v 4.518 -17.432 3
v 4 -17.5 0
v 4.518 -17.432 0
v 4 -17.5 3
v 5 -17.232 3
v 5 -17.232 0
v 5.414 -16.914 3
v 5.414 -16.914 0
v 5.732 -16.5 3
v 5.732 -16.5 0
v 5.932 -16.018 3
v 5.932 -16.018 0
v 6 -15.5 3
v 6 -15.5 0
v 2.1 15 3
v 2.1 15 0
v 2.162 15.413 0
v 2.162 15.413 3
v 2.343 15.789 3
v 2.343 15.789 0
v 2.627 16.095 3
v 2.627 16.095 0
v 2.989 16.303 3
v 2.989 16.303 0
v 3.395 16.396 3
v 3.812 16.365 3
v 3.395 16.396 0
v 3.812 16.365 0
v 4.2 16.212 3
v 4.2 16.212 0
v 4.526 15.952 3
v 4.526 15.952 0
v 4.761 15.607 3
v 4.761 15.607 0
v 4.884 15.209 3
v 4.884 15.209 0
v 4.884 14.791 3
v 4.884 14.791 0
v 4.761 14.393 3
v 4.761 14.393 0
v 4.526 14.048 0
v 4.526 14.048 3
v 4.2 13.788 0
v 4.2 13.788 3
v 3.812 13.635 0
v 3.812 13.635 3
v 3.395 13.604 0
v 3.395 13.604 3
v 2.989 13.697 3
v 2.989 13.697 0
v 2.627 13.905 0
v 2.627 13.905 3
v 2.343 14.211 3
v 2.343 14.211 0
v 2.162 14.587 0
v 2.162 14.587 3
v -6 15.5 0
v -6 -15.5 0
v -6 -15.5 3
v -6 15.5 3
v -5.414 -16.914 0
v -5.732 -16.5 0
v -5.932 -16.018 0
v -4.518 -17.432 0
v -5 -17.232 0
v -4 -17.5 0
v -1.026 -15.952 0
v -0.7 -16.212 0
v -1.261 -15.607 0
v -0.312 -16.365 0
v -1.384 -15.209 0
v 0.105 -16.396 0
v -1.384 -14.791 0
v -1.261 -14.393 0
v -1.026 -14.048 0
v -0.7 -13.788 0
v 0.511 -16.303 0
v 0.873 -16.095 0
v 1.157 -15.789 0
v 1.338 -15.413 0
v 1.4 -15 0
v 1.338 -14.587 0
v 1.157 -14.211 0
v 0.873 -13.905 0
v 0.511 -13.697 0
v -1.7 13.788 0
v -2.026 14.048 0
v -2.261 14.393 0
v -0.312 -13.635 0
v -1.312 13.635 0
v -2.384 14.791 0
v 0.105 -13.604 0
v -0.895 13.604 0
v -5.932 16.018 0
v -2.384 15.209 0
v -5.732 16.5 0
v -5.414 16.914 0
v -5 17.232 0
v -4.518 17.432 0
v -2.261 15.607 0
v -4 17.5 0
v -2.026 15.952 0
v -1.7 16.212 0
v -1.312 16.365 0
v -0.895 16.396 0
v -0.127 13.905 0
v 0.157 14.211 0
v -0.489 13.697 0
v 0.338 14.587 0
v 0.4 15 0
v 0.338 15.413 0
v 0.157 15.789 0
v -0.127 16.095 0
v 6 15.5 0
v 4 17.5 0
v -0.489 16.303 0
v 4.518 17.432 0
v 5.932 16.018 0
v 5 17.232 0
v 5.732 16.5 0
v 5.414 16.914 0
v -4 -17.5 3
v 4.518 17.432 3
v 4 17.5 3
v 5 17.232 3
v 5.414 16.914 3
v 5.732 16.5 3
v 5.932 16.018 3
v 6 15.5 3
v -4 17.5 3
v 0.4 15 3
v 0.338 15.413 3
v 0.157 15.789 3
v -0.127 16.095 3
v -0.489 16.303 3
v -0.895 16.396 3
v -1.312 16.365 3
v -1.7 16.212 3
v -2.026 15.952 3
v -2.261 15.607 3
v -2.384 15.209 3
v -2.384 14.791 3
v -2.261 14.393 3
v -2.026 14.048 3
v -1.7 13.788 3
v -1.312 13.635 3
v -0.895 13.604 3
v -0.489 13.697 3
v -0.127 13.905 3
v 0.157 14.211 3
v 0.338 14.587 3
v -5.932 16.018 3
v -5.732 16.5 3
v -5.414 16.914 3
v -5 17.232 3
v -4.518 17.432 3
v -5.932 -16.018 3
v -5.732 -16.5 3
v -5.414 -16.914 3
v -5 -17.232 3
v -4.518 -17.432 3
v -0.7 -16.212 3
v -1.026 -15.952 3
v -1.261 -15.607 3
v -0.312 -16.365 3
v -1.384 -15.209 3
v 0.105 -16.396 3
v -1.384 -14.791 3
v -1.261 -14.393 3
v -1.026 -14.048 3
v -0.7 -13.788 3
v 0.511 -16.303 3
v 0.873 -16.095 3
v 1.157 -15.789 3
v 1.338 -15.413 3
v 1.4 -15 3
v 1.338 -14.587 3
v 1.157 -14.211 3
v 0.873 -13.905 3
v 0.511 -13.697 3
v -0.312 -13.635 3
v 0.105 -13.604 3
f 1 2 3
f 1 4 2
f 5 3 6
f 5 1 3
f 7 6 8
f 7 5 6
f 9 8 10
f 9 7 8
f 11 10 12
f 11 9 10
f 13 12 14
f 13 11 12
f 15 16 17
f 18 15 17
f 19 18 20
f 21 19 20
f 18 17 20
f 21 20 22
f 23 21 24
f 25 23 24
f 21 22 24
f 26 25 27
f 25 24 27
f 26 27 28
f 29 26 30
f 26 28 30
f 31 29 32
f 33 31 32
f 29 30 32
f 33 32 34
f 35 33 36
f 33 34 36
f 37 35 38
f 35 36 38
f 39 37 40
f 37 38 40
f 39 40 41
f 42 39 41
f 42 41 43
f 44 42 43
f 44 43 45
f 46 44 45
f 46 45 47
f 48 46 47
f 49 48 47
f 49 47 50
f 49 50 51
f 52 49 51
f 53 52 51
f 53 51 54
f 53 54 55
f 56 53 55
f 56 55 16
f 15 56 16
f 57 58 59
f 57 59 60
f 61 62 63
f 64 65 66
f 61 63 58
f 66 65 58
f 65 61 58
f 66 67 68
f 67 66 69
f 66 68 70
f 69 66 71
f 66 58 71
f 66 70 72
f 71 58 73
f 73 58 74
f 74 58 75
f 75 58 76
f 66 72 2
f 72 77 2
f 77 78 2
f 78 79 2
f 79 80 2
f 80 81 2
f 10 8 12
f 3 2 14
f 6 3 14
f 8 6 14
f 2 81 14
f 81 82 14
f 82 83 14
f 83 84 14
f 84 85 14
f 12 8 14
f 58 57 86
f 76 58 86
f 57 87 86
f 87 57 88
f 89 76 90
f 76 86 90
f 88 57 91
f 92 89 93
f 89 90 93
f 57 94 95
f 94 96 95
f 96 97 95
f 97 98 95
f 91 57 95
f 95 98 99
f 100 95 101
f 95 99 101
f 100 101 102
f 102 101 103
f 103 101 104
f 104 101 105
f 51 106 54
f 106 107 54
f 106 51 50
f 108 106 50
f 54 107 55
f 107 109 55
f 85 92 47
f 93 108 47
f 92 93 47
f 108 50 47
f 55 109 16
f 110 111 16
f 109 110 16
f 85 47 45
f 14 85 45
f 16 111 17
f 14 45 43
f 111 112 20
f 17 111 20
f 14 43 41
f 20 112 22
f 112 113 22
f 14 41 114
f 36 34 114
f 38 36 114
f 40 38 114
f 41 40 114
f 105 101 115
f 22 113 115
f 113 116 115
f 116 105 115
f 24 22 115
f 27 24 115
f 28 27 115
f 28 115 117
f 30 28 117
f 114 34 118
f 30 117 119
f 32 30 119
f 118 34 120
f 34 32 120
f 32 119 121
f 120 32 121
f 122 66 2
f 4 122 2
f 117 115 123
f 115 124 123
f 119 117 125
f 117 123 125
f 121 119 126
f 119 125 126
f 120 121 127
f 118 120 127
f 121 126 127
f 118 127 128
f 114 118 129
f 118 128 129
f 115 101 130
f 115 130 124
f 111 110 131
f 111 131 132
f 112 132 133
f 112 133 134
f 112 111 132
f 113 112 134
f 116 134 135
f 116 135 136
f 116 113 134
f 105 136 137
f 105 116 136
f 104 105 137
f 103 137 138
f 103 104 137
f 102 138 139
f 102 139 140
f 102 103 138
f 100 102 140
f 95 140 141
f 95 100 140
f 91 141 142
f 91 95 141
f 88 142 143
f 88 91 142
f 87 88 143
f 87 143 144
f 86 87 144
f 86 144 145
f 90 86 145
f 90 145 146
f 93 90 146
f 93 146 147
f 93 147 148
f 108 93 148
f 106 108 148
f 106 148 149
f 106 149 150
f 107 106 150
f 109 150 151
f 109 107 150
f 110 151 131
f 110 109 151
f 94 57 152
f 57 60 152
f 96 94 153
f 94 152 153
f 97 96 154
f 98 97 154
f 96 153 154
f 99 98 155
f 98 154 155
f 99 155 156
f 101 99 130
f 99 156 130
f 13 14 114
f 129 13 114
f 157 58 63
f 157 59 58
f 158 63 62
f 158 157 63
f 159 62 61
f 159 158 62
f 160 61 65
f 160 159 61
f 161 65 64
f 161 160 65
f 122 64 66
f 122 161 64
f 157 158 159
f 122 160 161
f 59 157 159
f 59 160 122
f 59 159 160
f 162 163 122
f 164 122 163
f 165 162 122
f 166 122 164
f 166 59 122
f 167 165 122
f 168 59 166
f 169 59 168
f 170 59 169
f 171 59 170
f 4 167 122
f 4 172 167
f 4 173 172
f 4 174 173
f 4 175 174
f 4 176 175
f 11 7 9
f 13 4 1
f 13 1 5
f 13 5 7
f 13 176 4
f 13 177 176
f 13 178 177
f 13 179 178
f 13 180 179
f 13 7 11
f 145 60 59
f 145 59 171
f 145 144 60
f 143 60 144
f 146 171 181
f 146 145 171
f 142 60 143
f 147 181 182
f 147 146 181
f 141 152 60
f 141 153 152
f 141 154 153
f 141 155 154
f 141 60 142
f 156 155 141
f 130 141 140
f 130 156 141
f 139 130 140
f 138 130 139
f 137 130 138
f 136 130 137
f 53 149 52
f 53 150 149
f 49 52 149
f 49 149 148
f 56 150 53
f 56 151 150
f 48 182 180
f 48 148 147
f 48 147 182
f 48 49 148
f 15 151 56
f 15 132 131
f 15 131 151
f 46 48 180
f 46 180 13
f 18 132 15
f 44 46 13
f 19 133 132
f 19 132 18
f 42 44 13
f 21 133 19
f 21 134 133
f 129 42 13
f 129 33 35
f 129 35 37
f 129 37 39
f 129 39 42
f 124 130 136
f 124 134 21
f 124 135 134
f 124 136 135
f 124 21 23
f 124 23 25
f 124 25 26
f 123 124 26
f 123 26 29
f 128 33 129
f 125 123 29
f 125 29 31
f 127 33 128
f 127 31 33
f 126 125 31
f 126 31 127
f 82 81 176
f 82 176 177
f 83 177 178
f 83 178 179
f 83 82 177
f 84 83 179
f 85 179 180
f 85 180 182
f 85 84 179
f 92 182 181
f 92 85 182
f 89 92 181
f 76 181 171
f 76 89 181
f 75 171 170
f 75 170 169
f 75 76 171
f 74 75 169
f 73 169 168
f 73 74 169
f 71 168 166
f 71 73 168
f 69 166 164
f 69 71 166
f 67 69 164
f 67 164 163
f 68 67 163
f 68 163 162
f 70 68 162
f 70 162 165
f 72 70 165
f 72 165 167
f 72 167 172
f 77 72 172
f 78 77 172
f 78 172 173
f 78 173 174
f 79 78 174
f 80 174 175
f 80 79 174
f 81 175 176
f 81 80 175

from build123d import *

# Parameters (mm, degrees)
ESQUISSE1_W             = 12
ESQUISSE1_H             = 35
ESQUISSE1_R             = 1.4
BOSS_EXTRU_1_DEPTH      = 3
ESQUISSE2_R             = 1.4
ENL_V_MAT_EXTRU_1_DEPTH = 4
CONG_1_R                = 2


with BuildPart() as part:
    # Esquisse1 → Boss.-Extru.1 (new body)
    with BuildSketch(Plane.XY):
        Rectangle(ESQUISSE1_W, ESQUISSE1_H)
        with Locations((-1, 15)):
            Circle(ESQUISSE1_R, mode=Mode.SUBTRACT)
        with Locations((0, -15)):
            Circle(ESQUISSE1_R, mode=Mode.SUBTRACT)
    extrude(amount=BOSS_EXTRU_1_DEPTH)

    # Esquisse2 → Enlèv. mat.-Extru.1 (cut, through all)
    with BuildSketch(Plane(origin=(0, 0, 0), x_dir=(-1, 0, 0), z_dir=(0, 0, -1))):
        with Locations((-3.5, 15)):
            Circle(ESQUISSE2_R)
    extrude(amount=-ENL_V_MAT_EXTRU_1_DEPTH, mode=Mode.SUBTRACT)

    # Congé1
    cong_1_edges = [part.edges().sort_by_distance(p)[0] for p in [
        (-6, 17.5, 1.5),
        (6, 17.5, 1.5),
        (6, -17.5, 1.5),
        (-6, -17.5, 1.5),
    ]]
    fillet(cong_1_edges, radius=CONG_1_R)


solid = part.part
